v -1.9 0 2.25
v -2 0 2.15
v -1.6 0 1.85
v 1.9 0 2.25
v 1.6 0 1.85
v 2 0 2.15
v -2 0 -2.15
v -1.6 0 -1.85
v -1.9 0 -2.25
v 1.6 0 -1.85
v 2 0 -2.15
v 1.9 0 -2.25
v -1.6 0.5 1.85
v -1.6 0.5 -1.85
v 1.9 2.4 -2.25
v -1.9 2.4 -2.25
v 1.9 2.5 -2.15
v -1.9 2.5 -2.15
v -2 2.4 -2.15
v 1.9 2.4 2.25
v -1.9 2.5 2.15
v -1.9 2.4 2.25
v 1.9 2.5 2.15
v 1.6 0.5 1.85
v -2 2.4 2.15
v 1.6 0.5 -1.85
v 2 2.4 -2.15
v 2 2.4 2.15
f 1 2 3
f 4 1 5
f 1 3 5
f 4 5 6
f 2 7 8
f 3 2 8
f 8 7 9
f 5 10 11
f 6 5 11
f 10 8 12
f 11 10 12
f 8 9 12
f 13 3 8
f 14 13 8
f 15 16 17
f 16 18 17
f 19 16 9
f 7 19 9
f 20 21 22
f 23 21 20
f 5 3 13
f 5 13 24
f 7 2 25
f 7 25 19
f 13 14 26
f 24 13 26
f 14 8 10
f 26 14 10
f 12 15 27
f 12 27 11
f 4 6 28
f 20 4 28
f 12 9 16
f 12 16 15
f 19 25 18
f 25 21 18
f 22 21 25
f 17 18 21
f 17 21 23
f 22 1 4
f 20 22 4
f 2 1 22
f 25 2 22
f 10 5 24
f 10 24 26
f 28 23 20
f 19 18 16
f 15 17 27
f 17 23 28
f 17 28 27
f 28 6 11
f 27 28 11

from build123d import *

# Parameters (mm, degrees)
SKETCH1_W           = 4
SKETCH1_H           = 4.5
SKETCH1_W_2         = 3.2
SKETCH1_H_2         = 3.7
BOSS_EXTRUDE1_DEPTH = 0.5
SKETCH2_W           = 4
SKETCH2_H           = 4.5
BOSS_EXTRUDE2_DEPTH = 2
CHAMFER1_SIZE       = 0.1


with BuildPart() as part:
    # Sketch1 → Boss-Extrude1 (new body)
    with BuildSketch(Plane(origin=(0, 0, 0), x_dir=(1, 0, 0), z_dir=(0, 1, 0))):
        Rectangle(SKETCH1_W, SKETCH1_H)
        Rectangle(SKETCH1_W_2, SKETCH1_H_2, mode=Mode.SUBTRACT)
    extrude(amount=BOSS_EXTRUDE1_DEPTH)

    # Sketch2 → Boss-Extrude2 (add)
    with BuildSketch(Plane(origin=(0, 0.5, 0), x_dir=(1, 0, 0), z_dir=(0, 1, 0))):
        Rectangle(SKETCH2_W, SKETCH2_H)
    extrude(amount=BOSS_EXTRUDE2_DEPTH)

    # Chamfer1
    chamfer1_edges = [part.edges().sort_by_distance(p)[0] for p in [
        (0, 2.5, -2.25),
        (-2, 2.5, 0),
        (0, 2.5, 2.25),
        (2, 2.5, 0),
        (-2, 1.25, -2.25),
        (2, 1.25, -2.25),
        (2, 1.25, 2.25),
        (-2, 1.25, 2.25),
    ]]
    chamfer(chamfer1_edges, length=CHAMFER1_SIZE)


solid = part.part
